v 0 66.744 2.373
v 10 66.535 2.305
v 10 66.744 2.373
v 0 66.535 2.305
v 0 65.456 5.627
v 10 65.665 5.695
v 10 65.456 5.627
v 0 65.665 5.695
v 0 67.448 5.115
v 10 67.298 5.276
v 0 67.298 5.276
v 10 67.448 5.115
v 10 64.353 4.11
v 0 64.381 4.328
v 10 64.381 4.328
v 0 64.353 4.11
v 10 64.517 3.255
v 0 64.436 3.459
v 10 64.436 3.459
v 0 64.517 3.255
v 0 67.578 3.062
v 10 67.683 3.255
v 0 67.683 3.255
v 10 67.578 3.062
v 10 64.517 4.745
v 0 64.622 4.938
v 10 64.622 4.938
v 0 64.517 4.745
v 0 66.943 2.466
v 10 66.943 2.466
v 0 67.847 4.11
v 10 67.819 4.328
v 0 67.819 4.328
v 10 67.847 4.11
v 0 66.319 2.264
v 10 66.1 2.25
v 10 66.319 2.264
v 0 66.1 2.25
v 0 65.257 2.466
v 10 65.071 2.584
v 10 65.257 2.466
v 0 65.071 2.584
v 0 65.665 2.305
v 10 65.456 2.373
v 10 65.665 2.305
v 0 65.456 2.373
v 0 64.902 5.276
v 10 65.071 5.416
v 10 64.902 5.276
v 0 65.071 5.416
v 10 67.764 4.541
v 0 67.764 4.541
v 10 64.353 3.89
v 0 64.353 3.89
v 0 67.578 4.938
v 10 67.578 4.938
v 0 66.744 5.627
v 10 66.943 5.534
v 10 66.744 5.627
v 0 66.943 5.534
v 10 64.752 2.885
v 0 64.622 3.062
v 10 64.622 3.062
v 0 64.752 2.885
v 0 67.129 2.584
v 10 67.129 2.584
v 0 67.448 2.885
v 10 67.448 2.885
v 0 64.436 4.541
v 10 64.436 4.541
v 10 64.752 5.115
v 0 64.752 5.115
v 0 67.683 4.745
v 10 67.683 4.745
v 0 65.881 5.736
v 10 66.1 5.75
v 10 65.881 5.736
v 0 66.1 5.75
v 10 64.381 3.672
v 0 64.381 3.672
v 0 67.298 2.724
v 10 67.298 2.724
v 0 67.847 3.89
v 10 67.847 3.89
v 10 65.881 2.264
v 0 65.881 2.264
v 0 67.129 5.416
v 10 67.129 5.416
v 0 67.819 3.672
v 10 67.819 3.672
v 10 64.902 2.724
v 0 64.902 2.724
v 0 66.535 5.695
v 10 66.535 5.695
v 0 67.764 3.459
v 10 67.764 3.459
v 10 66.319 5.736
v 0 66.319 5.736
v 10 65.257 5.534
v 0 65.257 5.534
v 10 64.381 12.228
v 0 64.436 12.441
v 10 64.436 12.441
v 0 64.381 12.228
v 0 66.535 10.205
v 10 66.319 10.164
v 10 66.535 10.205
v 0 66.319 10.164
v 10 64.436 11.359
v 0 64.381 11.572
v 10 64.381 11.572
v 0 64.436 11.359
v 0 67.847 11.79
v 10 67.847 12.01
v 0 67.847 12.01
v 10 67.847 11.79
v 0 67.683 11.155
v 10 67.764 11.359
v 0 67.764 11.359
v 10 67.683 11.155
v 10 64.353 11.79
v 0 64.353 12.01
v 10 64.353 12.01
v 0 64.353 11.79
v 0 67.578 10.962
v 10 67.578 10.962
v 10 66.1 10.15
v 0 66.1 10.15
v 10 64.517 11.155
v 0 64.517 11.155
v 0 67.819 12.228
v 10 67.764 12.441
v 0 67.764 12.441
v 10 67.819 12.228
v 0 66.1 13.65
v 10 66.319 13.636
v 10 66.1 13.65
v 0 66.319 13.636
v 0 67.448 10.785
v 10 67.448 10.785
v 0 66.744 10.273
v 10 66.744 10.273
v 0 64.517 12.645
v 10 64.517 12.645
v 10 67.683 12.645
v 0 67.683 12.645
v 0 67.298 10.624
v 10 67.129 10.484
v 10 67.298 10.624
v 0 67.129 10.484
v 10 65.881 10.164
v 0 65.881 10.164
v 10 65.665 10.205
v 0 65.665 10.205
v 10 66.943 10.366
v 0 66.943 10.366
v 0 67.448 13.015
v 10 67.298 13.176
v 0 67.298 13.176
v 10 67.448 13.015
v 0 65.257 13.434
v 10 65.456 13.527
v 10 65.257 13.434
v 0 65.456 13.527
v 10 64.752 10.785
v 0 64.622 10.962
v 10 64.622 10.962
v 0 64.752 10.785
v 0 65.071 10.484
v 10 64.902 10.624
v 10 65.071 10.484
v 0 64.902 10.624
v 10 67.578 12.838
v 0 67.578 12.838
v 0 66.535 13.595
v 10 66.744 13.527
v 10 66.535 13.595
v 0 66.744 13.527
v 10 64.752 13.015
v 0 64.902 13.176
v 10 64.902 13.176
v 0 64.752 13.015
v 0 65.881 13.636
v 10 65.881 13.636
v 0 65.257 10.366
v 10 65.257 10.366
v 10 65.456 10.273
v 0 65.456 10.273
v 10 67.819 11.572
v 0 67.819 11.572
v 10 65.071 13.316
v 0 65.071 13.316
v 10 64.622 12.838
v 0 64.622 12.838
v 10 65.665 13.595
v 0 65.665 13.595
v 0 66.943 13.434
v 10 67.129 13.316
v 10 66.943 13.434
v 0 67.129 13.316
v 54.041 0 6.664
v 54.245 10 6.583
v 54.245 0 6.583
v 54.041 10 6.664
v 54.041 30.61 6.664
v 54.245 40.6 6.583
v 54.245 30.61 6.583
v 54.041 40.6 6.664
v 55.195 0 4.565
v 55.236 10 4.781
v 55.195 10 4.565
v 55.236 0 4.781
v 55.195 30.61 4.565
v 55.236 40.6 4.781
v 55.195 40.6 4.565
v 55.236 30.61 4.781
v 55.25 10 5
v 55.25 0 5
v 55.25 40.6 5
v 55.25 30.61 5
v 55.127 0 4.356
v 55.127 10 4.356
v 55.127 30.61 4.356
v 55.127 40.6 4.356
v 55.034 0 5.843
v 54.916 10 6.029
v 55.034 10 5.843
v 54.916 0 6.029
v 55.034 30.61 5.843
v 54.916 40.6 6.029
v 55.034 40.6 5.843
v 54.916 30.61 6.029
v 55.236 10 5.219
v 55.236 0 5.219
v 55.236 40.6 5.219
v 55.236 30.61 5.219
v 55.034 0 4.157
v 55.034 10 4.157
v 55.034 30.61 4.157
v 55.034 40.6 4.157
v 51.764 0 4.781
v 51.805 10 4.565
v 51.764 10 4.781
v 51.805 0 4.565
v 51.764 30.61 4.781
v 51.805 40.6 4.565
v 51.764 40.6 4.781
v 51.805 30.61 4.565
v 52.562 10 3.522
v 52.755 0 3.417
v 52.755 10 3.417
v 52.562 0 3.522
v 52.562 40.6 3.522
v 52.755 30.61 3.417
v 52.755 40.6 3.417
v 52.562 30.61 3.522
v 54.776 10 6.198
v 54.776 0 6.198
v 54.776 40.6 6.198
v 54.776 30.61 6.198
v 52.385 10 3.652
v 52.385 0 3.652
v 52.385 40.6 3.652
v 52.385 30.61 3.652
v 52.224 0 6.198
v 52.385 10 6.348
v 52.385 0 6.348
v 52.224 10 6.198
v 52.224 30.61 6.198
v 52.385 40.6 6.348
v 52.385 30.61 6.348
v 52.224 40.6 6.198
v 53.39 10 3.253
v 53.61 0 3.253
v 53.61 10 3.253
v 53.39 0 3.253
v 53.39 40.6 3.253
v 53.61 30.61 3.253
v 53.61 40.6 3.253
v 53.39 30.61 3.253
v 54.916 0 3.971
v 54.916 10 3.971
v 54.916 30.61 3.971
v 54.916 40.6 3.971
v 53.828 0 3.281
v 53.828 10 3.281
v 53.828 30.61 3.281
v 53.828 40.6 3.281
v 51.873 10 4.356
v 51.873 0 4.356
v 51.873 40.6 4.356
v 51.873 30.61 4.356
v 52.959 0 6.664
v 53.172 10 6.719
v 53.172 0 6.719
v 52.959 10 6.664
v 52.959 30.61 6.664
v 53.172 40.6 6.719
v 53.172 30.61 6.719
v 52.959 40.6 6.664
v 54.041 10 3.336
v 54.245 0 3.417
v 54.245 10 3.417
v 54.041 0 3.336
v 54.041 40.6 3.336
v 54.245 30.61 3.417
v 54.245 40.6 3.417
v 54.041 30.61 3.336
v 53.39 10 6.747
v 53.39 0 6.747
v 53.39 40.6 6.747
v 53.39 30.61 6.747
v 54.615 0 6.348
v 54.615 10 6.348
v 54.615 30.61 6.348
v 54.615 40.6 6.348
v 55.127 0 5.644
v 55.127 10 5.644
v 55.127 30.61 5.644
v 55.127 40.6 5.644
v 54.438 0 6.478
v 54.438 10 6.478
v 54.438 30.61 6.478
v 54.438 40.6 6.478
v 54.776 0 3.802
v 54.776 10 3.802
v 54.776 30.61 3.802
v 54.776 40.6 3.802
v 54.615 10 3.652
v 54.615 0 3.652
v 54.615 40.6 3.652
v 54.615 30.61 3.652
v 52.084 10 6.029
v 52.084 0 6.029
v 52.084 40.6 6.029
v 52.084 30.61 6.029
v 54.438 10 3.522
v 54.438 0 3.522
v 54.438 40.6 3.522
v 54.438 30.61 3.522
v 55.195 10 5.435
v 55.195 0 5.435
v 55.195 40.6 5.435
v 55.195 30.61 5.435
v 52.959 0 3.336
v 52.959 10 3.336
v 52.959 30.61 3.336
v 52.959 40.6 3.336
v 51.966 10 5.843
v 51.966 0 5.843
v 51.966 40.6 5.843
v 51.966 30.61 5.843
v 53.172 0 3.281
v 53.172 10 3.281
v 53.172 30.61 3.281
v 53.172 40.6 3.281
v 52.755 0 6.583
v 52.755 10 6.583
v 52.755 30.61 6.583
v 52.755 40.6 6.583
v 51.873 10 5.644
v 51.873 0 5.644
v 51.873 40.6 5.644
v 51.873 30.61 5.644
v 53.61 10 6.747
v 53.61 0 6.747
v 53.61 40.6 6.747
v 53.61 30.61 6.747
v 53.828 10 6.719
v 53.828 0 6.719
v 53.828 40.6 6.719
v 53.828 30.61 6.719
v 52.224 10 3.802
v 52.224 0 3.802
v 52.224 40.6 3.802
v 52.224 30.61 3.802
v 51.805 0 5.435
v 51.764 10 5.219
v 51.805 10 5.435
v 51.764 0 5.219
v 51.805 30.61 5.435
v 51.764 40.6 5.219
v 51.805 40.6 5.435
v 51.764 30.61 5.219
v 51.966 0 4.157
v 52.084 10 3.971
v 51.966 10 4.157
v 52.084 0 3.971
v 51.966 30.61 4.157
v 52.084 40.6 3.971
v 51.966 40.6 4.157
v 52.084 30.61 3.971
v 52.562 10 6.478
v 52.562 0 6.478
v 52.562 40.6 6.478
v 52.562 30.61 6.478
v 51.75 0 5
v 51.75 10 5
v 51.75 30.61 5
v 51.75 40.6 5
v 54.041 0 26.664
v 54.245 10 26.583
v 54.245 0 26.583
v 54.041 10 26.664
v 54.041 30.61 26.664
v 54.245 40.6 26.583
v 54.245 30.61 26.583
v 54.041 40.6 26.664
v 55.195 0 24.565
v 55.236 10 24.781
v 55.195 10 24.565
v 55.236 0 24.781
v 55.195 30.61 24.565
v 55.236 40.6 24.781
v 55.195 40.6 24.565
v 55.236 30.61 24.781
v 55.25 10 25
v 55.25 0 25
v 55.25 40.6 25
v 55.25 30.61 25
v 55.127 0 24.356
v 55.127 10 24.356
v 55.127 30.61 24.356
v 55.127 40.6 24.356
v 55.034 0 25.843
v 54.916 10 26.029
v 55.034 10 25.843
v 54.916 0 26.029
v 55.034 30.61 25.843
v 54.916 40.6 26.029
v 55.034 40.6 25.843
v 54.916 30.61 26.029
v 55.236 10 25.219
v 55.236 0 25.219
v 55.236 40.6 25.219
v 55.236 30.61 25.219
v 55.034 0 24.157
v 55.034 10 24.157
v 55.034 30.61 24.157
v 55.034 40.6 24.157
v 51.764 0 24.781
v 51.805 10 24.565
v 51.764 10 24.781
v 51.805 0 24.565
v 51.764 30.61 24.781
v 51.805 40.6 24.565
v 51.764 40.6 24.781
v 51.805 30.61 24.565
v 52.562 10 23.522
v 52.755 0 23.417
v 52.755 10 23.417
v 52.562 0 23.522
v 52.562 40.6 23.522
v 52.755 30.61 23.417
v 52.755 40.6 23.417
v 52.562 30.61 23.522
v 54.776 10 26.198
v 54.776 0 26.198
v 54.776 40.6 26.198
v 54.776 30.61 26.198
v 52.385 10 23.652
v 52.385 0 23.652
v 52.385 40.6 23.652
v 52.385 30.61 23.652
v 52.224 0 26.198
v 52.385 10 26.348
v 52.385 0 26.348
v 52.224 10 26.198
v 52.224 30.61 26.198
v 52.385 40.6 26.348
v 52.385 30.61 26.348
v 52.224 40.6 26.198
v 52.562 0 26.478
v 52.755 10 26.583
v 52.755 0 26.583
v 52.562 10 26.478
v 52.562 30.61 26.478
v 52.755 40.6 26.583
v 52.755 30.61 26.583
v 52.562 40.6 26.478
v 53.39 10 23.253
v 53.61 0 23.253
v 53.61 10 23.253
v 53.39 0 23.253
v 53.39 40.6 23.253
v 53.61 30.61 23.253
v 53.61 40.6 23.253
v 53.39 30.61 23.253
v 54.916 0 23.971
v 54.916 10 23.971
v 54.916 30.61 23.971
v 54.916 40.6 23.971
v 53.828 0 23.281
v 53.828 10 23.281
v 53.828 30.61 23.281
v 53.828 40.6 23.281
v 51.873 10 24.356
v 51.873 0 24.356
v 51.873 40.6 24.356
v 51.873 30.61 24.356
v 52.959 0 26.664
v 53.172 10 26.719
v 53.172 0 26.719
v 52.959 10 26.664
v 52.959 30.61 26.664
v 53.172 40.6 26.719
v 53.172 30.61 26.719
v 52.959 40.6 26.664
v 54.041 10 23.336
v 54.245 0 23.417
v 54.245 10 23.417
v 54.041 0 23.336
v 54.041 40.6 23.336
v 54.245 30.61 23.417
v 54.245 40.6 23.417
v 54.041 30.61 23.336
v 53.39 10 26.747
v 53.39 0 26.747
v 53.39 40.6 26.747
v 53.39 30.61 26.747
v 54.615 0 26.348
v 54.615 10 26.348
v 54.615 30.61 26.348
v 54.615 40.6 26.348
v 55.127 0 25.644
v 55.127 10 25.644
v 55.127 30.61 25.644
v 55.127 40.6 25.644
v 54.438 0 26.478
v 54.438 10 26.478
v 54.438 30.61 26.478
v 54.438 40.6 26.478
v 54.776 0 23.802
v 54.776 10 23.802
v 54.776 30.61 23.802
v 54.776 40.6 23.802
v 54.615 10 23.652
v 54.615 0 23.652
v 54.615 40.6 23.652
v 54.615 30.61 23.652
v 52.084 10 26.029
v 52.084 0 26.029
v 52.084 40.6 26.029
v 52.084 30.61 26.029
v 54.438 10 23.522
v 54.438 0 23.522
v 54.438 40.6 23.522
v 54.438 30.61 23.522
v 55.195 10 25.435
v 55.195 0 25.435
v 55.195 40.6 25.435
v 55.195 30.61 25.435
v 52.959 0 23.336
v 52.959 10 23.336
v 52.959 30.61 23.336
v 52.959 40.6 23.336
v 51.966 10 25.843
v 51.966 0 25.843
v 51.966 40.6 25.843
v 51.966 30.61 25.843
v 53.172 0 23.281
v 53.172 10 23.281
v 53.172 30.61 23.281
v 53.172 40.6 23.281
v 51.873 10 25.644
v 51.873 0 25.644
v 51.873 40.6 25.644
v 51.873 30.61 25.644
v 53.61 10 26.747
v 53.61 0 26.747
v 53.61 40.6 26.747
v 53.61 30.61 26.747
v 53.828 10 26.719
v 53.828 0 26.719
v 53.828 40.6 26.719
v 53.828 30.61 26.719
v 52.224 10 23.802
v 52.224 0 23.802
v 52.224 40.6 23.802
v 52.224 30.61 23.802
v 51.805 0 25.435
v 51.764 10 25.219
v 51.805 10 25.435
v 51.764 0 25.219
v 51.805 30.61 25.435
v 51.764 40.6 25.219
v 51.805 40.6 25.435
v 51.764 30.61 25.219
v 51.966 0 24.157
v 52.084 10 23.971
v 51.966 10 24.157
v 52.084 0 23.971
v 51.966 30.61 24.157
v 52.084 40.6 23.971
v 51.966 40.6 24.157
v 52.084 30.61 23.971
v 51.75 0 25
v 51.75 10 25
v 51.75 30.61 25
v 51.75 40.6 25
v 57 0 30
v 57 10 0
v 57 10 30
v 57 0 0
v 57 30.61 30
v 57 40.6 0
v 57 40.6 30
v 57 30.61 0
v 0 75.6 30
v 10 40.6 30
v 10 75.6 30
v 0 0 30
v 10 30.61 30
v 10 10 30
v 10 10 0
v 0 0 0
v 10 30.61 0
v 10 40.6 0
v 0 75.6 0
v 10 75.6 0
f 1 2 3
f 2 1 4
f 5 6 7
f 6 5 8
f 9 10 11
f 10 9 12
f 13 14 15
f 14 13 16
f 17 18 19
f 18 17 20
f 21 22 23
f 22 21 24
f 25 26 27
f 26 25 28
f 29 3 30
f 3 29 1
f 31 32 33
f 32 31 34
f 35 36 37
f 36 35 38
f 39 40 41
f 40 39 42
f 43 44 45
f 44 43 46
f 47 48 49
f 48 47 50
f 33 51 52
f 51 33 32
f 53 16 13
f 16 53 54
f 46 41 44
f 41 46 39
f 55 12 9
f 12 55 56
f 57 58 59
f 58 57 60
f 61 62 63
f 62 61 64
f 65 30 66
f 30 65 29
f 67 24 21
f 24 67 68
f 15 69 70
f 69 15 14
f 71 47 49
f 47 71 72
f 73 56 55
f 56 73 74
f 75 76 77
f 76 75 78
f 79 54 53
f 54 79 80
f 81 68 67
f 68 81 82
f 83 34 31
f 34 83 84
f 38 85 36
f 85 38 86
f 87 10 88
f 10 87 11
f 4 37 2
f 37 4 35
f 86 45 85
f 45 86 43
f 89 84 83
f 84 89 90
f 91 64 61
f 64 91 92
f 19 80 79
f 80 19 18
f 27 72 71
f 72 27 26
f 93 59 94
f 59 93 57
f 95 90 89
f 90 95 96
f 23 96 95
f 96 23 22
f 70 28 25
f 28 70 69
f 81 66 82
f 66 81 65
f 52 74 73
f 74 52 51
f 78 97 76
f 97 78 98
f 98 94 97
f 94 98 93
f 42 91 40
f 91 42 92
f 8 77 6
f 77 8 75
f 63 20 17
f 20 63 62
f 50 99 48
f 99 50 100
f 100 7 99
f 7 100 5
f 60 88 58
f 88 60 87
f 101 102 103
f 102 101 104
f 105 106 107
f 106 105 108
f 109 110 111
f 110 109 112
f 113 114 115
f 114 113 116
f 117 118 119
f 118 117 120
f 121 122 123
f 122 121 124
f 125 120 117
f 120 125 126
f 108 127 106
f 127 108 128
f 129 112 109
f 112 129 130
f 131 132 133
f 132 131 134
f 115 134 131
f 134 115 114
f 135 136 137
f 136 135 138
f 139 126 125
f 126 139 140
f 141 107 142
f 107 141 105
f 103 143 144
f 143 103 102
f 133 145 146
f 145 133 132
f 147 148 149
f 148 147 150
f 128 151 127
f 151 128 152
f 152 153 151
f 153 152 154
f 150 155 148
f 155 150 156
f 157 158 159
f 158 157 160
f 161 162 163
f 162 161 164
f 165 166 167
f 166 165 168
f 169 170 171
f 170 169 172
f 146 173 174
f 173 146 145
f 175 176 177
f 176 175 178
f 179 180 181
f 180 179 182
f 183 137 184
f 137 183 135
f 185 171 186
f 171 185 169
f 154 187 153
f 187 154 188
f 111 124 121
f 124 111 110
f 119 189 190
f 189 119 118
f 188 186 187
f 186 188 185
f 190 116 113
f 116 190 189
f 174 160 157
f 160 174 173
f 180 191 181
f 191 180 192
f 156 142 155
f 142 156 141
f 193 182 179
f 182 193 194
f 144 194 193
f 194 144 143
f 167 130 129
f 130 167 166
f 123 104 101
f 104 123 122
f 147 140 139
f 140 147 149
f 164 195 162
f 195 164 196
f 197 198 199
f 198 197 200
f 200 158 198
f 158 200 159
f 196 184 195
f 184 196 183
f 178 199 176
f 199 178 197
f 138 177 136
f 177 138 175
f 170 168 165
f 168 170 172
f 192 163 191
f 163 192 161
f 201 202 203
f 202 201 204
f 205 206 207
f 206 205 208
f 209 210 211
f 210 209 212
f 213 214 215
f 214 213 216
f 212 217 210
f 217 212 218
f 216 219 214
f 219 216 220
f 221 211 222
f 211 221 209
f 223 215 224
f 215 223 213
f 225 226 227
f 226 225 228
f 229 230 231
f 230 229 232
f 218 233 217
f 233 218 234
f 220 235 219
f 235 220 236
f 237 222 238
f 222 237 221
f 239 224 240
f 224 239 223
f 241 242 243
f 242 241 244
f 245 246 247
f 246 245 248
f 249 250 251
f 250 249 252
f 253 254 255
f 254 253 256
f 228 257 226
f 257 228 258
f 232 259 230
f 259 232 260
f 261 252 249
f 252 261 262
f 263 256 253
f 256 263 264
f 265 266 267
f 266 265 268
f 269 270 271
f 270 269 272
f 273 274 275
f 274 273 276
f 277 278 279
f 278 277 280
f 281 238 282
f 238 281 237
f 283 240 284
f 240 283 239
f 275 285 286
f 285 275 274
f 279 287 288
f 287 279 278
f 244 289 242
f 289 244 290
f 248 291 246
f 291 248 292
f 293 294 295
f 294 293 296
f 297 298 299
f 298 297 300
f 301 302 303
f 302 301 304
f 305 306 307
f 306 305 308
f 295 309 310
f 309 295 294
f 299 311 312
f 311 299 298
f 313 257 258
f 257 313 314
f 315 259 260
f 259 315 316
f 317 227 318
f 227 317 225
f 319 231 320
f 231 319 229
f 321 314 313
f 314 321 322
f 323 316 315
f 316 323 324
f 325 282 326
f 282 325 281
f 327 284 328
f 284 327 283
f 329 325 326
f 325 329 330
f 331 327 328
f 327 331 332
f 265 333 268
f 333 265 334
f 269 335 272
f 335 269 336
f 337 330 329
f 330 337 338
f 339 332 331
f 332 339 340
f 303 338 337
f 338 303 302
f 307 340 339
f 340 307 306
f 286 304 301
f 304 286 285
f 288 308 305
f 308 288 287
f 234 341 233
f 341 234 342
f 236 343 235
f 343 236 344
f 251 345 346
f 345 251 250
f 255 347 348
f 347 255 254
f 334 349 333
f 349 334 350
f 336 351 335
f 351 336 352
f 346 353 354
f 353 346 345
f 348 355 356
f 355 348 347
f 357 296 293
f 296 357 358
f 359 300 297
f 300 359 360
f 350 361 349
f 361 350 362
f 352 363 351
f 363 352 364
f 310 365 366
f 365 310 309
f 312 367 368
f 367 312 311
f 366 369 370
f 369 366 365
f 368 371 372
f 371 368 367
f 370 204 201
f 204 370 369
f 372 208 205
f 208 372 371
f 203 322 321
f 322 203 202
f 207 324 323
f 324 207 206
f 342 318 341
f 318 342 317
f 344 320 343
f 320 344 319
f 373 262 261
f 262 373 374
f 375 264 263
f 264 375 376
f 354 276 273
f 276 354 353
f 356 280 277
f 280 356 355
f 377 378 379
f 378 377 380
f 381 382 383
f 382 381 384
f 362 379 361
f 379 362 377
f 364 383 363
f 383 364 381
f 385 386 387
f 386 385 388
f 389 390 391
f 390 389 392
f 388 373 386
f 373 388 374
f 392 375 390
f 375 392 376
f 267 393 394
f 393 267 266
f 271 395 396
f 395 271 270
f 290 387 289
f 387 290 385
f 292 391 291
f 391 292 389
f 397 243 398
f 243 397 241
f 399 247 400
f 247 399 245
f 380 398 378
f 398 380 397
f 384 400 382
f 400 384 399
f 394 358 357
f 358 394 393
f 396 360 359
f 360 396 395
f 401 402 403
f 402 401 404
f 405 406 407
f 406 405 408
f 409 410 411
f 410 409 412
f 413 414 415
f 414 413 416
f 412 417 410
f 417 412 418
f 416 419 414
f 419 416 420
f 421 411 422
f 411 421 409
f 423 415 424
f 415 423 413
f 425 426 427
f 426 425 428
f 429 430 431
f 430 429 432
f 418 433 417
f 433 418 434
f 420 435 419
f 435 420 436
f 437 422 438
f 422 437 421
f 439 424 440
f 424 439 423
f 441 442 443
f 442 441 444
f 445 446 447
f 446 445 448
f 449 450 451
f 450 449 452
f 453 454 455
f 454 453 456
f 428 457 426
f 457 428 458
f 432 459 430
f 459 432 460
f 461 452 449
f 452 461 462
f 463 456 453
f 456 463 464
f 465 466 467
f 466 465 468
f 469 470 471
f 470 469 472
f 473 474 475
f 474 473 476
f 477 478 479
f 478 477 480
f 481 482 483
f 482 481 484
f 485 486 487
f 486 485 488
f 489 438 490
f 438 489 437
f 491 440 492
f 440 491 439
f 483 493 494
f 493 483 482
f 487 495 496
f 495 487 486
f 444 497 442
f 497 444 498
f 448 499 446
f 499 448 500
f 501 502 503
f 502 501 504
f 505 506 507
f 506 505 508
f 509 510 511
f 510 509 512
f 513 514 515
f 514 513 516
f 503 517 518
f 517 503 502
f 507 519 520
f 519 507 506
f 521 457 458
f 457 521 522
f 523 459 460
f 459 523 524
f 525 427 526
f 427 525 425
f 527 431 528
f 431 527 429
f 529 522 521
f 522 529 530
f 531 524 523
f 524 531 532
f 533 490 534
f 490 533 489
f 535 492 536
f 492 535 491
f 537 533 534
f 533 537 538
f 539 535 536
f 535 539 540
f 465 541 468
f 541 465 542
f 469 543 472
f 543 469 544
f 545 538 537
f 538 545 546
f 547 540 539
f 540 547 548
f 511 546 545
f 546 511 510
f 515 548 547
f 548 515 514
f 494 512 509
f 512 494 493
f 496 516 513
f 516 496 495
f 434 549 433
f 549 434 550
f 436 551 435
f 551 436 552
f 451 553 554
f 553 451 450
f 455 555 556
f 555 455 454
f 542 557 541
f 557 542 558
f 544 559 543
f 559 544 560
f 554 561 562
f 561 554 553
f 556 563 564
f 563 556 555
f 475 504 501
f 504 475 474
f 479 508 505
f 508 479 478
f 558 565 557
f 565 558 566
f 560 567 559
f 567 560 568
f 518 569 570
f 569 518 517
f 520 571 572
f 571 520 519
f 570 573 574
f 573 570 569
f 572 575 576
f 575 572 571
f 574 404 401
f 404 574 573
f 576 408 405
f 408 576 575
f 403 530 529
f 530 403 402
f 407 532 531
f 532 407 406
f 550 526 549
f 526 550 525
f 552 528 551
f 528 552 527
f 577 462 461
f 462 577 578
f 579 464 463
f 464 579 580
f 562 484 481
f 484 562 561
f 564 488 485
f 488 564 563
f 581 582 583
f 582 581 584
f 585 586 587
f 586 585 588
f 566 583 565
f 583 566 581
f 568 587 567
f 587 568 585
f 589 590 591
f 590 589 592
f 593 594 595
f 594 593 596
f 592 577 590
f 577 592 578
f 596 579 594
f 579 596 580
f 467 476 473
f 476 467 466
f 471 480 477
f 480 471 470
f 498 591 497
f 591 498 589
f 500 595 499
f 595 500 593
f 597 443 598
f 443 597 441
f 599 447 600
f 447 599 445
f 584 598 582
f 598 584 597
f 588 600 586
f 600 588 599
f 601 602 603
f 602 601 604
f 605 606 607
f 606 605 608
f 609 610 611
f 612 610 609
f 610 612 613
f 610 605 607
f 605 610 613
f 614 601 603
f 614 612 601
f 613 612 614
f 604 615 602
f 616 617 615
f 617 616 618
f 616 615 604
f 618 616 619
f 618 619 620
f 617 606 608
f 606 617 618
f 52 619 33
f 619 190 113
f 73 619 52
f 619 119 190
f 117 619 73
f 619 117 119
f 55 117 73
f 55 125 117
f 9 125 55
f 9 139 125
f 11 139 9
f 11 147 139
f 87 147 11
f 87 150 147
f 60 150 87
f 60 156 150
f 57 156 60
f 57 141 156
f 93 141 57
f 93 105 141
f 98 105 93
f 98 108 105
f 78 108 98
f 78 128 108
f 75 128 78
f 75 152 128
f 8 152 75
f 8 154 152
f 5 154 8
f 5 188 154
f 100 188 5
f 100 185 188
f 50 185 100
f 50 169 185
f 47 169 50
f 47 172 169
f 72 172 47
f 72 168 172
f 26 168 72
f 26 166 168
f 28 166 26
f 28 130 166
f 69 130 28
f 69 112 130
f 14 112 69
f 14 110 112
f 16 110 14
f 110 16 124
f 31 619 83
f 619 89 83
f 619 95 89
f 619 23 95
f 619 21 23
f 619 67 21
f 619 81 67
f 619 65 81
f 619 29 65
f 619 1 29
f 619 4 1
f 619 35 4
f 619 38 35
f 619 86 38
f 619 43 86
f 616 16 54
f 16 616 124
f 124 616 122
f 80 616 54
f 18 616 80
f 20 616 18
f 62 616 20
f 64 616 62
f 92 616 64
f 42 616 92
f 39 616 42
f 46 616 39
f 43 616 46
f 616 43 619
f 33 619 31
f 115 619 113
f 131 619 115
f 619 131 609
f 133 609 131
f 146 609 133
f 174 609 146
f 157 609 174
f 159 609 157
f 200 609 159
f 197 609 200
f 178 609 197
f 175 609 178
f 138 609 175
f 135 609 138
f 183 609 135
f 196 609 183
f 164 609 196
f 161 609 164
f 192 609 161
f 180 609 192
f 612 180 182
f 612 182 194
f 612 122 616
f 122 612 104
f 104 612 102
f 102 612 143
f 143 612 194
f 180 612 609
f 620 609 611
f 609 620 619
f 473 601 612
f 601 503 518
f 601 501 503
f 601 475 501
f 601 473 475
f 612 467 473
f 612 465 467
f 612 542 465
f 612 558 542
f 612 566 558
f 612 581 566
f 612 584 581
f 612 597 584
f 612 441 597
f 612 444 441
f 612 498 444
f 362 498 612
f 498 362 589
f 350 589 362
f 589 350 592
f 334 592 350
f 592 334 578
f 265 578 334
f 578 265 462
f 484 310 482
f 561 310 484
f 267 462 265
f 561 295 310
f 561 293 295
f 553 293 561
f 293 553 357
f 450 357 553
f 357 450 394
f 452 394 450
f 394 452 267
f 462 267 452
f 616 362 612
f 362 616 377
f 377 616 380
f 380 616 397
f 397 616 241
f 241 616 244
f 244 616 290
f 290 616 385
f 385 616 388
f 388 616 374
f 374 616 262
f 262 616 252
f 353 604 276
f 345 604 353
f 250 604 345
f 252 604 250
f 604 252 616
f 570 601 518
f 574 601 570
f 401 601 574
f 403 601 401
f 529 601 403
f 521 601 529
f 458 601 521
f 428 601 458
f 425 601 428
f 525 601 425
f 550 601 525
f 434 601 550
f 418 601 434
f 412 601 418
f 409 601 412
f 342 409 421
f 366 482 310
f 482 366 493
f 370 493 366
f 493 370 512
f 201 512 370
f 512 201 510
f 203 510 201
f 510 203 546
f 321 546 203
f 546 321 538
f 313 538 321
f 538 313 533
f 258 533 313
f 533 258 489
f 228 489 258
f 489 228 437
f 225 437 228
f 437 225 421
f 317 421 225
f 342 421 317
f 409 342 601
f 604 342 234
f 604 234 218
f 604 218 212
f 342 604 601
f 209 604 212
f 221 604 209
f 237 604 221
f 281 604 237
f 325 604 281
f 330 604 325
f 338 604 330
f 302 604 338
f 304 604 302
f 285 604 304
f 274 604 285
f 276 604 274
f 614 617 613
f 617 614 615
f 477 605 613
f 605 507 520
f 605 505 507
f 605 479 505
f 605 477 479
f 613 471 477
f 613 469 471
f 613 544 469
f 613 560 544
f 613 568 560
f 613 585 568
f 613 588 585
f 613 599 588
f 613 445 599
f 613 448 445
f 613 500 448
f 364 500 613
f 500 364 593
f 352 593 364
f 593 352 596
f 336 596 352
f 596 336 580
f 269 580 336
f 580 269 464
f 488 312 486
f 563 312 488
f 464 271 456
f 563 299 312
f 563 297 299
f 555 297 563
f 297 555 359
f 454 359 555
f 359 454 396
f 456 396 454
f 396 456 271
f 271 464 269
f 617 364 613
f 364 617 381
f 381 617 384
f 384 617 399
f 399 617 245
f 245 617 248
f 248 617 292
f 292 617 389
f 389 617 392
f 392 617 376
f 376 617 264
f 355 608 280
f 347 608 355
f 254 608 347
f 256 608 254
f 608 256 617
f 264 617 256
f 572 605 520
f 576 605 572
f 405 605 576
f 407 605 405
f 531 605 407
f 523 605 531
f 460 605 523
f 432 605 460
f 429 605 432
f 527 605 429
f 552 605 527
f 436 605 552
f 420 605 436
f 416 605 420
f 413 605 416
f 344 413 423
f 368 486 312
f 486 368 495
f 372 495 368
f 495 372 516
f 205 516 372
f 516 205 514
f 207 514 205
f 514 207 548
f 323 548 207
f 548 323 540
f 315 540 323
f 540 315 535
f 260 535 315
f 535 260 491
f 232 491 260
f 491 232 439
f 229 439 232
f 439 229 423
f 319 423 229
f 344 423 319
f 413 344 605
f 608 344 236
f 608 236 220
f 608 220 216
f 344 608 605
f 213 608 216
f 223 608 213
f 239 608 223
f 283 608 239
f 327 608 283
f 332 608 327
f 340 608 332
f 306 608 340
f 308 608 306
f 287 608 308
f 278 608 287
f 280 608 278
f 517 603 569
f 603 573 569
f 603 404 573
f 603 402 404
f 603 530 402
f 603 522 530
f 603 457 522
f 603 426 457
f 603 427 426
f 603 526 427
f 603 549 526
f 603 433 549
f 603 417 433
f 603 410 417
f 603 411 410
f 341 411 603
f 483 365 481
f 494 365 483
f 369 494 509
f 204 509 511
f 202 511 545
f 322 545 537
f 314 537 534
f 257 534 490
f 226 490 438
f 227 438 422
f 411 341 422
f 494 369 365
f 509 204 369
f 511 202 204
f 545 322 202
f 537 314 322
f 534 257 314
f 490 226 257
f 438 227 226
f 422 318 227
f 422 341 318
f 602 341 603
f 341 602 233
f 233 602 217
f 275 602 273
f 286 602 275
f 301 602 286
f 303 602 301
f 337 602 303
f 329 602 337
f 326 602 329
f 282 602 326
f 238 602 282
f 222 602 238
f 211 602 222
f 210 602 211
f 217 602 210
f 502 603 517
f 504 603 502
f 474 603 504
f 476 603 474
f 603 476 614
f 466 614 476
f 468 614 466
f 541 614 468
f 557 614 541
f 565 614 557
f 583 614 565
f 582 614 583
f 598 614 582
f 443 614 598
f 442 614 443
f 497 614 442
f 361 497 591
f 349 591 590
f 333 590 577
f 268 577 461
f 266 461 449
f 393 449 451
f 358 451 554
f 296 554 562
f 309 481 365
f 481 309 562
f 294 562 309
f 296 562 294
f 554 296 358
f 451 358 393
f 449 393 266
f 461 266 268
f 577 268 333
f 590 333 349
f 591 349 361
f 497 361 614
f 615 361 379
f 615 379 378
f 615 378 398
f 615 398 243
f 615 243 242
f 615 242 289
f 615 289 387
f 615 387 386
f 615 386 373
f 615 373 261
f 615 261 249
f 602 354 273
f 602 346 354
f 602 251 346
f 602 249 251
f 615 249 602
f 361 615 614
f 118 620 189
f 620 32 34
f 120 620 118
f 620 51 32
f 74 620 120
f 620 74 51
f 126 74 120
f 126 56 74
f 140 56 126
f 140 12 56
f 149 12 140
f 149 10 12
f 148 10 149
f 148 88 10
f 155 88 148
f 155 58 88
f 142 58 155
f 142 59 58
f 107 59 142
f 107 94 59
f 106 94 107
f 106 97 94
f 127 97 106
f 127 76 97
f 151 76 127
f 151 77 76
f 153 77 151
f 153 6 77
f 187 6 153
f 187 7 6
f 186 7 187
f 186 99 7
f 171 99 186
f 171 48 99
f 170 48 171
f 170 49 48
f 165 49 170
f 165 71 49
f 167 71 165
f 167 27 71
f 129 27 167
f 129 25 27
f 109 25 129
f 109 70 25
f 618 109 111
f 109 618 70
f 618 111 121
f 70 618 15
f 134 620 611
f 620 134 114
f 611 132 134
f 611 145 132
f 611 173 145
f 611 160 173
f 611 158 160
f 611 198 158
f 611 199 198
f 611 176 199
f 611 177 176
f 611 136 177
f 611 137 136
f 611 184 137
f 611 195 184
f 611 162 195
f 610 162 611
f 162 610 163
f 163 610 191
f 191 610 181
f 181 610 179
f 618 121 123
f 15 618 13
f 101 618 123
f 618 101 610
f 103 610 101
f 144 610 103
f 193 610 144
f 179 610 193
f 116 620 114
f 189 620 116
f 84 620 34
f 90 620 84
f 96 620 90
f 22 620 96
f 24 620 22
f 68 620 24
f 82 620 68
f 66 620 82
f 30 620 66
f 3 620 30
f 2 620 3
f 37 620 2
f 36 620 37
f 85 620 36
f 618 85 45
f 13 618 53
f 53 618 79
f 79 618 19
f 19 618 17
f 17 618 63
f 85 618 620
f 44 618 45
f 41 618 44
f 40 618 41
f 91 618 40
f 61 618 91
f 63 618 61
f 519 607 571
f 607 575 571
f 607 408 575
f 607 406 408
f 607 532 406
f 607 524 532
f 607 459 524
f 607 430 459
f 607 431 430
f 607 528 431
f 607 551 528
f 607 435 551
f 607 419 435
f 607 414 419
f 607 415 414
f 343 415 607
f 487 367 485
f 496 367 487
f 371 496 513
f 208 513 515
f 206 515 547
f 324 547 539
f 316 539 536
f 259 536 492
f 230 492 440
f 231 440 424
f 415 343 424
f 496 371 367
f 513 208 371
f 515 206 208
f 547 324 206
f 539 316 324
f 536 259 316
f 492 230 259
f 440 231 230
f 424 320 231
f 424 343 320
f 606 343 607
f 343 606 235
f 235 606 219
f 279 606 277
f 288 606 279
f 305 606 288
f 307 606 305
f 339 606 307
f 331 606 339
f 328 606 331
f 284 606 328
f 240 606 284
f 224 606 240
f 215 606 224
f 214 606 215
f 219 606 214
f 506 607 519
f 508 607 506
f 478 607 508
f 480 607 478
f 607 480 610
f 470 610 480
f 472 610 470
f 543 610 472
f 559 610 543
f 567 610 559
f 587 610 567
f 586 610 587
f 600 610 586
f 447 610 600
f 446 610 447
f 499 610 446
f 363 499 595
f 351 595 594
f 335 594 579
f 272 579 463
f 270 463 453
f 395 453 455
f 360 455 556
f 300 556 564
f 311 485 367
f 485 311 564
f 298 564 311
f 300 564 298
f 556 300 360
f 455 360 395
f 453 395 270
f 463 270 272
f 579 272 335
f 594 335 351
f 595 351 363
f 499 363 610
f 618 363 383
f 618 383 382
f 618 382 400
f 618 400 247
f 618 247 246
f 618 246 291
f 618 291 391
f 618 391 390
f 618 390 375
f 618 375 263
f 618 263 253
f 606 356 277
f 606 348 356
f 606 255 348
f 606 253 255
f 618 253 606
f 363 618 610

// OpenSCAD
eps=0.01;
h=30;

difference()
{
  cube([10+47, 10+20.6+10+35, h]);
  // profile cut-in
  translate([10, 10, -eps])
    cube([47+eps, 20.6+eps, h+2*eps]);
  // top cut-in
  translate([10, 10+20.6+10, -eps])
    cube([47+eps, 35+eps, h+2*eps]);
  // cable guide screws
  for(dz=[2.5, 10.4])
    translate([-eps, 10+20.6+10+35 - 19/2, dz+1.5])
      rotate([0, 90, 0])
        #cylinder(r=3.5/2, h=10+2*eps, $fn=50);
  // tightening screws
  for(dz=[10/2, h-10/2])
    translate([10+47 - 7/2, -eps, dz])
      rotate([-90, 0, 0])
        cylinder(r=3.5/2, h=10+20.8+10+2*eps, $fn=50);
}
